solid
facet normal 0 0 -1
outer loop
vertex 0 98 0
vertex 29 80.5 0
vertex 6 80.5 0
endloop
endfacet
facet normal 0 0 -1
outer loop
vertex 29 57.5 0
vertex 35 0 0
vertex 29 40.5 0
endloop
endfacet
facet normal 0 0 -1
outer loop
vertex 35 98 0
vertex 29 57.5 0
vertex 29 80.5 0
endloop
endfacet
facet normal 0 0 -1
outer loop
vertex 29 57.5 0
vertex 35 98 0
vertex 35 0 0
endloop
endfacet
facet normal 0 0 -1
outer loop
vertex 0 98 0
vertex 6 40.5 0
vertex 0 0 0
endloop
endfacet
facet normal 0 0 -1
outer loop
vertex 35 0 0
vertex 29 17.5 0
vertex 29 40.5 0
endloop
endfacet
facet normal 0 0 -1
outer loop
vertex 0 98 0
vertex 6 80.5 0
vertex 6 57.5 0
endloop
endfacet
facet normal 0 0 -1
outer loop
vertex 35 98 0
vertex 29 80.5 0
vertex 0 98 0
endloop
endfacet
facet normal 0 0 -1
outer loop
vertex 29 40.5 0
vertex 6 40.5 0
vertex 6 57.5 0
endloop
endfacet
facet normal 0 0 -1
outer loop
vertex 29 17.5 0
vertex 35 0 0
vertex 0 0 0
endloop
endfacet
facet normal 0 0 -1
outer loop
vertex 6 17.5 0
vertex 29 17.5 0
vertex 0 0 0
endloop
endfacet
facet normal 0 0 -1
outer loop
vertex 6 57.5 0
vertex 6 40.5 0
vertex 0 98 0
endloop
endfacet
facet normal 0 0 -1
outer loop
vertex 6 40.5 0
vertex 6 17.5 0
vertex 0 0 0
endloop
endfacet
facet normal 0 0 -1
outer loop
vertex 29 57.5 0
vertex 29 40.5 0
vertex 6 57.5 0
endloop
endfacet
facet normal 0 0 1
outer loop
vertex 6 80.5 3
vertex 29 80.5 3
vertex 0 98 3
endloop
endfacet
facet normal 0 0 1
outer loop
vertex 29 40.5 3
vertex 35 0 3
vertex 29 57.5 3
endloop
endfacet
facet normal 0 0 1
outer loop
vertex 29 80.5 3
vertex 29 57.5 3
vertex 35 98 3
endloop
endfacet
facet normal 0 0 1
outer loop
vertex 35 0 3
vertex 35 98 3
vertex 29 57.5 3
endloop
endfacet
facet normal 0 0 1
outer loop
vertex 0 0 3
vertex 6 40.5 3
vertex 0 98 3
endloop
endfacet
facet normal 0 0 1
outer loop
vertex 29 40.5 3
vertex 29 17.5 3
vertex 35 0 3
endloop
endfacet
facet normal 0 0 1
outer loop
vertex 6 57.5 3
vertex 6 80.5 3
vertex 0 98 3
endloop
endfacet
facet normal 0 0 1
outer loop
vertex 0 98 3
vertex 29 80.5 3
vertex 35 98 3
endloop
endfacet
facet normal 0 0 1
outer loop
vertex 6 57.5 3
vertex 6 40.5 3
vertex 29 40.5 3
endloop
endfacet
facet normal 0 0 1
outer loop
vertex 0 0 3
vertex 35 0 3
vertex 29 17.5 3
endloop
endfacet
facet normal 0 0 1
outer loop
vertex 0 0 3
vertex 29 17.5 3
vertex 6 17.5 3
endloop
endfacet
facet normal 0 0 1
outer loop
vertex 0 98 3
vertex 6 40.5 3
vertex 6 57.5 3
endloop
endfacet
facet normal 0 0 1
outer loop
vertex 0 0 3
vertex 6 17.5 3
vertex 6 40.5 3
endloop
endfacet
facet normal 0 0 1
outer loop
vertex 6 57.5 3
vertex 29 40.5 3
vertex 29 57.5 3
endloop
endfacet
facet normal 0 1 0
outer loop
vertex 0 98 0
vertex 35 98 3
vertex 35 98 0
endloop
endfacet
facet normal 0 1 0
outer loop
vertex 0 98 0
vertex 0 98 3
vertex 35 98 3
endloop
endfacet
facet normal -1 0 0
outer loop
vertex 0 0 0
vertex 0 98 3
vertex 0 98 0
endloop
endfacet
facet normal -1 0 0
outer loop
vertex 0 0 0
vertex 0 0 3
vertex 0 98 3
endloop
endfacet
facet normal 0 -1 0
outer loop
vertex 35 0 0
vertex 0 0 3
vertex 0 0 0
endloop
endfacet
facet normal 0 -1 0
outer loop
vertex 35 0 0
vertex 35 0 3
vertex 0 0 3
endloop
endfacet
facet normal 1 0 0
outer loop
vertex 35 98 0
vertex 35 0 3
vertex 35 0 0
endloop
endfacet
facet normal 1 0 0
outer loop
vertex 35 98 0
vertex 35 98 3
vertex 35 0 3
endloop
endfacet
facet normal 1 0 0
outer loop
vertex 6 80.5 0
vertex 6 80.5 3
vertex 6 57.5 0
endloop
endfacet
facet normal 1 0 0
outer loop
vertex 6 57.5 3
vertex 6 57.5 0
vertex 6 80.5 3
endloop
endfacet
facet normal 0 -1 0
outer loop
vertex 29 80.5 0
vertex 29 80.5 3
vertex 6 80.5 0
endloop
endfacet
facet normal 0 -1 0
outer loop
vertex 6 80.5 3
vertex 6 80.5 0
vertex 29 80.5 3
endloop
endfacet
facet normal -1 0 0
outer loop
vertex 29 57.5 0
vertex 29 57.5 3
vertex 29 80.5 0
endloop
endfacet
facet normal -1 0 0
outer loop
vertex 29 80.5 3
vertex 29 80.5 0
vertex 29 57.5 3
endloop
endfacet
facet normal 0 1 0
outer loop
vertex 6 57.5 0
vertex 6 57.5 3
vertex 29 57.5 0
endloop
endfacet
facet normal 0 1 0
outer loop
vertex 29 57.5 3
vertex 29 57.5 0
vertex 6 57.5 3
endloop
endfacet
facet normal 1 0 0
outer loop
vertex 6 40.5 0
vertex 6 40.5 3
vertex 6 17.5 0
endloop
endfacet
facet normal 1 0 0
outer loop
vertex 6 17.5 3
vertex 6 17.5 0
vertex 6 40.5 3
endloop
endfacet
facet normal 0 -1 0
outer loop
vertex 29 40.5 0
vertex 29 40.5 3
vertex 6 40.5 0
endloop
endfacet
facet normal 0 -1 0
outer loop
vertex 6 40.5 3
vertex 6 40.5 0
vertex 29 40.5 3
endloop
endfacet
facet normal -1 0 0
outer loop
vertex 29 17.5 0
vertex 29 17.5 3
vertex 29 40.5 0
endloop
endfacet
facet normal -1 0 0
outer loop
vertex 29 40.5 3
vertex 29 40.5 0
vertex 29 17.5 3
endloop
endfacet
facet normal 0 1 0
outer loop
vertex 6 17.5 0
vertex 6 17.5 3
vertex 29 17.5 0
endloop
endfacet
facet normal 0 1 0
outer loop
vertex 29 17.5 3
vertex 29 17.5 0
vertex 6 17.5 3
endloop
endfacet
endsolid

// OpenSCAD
gap = 9;
bandlength =80;
seedcube =23;
bandwidth=35;
//totalbandlength=gap+bandlength+gap
centerpoint= (bandlength/2)+gap;

linear_extrude(3) difference(){
square([bandwidth,gap+bandlength+gap]);
 
    translate([OffsetY(),OffsetX(gap),0]){square(seedcube);}
    translate([OffsetY(),OffsetSeedCube(OffsetX()*2),0])square(seedcube);
}

function OffsetX(x=0)=(((bandlength/2)-seedcube)/2)+x;

function OffsetY(y=0)=((bandwidth-seedcube)/2)+y;

function OffsetSeedCube(x=0) = OffsetX(gap)+seedcube+x;
